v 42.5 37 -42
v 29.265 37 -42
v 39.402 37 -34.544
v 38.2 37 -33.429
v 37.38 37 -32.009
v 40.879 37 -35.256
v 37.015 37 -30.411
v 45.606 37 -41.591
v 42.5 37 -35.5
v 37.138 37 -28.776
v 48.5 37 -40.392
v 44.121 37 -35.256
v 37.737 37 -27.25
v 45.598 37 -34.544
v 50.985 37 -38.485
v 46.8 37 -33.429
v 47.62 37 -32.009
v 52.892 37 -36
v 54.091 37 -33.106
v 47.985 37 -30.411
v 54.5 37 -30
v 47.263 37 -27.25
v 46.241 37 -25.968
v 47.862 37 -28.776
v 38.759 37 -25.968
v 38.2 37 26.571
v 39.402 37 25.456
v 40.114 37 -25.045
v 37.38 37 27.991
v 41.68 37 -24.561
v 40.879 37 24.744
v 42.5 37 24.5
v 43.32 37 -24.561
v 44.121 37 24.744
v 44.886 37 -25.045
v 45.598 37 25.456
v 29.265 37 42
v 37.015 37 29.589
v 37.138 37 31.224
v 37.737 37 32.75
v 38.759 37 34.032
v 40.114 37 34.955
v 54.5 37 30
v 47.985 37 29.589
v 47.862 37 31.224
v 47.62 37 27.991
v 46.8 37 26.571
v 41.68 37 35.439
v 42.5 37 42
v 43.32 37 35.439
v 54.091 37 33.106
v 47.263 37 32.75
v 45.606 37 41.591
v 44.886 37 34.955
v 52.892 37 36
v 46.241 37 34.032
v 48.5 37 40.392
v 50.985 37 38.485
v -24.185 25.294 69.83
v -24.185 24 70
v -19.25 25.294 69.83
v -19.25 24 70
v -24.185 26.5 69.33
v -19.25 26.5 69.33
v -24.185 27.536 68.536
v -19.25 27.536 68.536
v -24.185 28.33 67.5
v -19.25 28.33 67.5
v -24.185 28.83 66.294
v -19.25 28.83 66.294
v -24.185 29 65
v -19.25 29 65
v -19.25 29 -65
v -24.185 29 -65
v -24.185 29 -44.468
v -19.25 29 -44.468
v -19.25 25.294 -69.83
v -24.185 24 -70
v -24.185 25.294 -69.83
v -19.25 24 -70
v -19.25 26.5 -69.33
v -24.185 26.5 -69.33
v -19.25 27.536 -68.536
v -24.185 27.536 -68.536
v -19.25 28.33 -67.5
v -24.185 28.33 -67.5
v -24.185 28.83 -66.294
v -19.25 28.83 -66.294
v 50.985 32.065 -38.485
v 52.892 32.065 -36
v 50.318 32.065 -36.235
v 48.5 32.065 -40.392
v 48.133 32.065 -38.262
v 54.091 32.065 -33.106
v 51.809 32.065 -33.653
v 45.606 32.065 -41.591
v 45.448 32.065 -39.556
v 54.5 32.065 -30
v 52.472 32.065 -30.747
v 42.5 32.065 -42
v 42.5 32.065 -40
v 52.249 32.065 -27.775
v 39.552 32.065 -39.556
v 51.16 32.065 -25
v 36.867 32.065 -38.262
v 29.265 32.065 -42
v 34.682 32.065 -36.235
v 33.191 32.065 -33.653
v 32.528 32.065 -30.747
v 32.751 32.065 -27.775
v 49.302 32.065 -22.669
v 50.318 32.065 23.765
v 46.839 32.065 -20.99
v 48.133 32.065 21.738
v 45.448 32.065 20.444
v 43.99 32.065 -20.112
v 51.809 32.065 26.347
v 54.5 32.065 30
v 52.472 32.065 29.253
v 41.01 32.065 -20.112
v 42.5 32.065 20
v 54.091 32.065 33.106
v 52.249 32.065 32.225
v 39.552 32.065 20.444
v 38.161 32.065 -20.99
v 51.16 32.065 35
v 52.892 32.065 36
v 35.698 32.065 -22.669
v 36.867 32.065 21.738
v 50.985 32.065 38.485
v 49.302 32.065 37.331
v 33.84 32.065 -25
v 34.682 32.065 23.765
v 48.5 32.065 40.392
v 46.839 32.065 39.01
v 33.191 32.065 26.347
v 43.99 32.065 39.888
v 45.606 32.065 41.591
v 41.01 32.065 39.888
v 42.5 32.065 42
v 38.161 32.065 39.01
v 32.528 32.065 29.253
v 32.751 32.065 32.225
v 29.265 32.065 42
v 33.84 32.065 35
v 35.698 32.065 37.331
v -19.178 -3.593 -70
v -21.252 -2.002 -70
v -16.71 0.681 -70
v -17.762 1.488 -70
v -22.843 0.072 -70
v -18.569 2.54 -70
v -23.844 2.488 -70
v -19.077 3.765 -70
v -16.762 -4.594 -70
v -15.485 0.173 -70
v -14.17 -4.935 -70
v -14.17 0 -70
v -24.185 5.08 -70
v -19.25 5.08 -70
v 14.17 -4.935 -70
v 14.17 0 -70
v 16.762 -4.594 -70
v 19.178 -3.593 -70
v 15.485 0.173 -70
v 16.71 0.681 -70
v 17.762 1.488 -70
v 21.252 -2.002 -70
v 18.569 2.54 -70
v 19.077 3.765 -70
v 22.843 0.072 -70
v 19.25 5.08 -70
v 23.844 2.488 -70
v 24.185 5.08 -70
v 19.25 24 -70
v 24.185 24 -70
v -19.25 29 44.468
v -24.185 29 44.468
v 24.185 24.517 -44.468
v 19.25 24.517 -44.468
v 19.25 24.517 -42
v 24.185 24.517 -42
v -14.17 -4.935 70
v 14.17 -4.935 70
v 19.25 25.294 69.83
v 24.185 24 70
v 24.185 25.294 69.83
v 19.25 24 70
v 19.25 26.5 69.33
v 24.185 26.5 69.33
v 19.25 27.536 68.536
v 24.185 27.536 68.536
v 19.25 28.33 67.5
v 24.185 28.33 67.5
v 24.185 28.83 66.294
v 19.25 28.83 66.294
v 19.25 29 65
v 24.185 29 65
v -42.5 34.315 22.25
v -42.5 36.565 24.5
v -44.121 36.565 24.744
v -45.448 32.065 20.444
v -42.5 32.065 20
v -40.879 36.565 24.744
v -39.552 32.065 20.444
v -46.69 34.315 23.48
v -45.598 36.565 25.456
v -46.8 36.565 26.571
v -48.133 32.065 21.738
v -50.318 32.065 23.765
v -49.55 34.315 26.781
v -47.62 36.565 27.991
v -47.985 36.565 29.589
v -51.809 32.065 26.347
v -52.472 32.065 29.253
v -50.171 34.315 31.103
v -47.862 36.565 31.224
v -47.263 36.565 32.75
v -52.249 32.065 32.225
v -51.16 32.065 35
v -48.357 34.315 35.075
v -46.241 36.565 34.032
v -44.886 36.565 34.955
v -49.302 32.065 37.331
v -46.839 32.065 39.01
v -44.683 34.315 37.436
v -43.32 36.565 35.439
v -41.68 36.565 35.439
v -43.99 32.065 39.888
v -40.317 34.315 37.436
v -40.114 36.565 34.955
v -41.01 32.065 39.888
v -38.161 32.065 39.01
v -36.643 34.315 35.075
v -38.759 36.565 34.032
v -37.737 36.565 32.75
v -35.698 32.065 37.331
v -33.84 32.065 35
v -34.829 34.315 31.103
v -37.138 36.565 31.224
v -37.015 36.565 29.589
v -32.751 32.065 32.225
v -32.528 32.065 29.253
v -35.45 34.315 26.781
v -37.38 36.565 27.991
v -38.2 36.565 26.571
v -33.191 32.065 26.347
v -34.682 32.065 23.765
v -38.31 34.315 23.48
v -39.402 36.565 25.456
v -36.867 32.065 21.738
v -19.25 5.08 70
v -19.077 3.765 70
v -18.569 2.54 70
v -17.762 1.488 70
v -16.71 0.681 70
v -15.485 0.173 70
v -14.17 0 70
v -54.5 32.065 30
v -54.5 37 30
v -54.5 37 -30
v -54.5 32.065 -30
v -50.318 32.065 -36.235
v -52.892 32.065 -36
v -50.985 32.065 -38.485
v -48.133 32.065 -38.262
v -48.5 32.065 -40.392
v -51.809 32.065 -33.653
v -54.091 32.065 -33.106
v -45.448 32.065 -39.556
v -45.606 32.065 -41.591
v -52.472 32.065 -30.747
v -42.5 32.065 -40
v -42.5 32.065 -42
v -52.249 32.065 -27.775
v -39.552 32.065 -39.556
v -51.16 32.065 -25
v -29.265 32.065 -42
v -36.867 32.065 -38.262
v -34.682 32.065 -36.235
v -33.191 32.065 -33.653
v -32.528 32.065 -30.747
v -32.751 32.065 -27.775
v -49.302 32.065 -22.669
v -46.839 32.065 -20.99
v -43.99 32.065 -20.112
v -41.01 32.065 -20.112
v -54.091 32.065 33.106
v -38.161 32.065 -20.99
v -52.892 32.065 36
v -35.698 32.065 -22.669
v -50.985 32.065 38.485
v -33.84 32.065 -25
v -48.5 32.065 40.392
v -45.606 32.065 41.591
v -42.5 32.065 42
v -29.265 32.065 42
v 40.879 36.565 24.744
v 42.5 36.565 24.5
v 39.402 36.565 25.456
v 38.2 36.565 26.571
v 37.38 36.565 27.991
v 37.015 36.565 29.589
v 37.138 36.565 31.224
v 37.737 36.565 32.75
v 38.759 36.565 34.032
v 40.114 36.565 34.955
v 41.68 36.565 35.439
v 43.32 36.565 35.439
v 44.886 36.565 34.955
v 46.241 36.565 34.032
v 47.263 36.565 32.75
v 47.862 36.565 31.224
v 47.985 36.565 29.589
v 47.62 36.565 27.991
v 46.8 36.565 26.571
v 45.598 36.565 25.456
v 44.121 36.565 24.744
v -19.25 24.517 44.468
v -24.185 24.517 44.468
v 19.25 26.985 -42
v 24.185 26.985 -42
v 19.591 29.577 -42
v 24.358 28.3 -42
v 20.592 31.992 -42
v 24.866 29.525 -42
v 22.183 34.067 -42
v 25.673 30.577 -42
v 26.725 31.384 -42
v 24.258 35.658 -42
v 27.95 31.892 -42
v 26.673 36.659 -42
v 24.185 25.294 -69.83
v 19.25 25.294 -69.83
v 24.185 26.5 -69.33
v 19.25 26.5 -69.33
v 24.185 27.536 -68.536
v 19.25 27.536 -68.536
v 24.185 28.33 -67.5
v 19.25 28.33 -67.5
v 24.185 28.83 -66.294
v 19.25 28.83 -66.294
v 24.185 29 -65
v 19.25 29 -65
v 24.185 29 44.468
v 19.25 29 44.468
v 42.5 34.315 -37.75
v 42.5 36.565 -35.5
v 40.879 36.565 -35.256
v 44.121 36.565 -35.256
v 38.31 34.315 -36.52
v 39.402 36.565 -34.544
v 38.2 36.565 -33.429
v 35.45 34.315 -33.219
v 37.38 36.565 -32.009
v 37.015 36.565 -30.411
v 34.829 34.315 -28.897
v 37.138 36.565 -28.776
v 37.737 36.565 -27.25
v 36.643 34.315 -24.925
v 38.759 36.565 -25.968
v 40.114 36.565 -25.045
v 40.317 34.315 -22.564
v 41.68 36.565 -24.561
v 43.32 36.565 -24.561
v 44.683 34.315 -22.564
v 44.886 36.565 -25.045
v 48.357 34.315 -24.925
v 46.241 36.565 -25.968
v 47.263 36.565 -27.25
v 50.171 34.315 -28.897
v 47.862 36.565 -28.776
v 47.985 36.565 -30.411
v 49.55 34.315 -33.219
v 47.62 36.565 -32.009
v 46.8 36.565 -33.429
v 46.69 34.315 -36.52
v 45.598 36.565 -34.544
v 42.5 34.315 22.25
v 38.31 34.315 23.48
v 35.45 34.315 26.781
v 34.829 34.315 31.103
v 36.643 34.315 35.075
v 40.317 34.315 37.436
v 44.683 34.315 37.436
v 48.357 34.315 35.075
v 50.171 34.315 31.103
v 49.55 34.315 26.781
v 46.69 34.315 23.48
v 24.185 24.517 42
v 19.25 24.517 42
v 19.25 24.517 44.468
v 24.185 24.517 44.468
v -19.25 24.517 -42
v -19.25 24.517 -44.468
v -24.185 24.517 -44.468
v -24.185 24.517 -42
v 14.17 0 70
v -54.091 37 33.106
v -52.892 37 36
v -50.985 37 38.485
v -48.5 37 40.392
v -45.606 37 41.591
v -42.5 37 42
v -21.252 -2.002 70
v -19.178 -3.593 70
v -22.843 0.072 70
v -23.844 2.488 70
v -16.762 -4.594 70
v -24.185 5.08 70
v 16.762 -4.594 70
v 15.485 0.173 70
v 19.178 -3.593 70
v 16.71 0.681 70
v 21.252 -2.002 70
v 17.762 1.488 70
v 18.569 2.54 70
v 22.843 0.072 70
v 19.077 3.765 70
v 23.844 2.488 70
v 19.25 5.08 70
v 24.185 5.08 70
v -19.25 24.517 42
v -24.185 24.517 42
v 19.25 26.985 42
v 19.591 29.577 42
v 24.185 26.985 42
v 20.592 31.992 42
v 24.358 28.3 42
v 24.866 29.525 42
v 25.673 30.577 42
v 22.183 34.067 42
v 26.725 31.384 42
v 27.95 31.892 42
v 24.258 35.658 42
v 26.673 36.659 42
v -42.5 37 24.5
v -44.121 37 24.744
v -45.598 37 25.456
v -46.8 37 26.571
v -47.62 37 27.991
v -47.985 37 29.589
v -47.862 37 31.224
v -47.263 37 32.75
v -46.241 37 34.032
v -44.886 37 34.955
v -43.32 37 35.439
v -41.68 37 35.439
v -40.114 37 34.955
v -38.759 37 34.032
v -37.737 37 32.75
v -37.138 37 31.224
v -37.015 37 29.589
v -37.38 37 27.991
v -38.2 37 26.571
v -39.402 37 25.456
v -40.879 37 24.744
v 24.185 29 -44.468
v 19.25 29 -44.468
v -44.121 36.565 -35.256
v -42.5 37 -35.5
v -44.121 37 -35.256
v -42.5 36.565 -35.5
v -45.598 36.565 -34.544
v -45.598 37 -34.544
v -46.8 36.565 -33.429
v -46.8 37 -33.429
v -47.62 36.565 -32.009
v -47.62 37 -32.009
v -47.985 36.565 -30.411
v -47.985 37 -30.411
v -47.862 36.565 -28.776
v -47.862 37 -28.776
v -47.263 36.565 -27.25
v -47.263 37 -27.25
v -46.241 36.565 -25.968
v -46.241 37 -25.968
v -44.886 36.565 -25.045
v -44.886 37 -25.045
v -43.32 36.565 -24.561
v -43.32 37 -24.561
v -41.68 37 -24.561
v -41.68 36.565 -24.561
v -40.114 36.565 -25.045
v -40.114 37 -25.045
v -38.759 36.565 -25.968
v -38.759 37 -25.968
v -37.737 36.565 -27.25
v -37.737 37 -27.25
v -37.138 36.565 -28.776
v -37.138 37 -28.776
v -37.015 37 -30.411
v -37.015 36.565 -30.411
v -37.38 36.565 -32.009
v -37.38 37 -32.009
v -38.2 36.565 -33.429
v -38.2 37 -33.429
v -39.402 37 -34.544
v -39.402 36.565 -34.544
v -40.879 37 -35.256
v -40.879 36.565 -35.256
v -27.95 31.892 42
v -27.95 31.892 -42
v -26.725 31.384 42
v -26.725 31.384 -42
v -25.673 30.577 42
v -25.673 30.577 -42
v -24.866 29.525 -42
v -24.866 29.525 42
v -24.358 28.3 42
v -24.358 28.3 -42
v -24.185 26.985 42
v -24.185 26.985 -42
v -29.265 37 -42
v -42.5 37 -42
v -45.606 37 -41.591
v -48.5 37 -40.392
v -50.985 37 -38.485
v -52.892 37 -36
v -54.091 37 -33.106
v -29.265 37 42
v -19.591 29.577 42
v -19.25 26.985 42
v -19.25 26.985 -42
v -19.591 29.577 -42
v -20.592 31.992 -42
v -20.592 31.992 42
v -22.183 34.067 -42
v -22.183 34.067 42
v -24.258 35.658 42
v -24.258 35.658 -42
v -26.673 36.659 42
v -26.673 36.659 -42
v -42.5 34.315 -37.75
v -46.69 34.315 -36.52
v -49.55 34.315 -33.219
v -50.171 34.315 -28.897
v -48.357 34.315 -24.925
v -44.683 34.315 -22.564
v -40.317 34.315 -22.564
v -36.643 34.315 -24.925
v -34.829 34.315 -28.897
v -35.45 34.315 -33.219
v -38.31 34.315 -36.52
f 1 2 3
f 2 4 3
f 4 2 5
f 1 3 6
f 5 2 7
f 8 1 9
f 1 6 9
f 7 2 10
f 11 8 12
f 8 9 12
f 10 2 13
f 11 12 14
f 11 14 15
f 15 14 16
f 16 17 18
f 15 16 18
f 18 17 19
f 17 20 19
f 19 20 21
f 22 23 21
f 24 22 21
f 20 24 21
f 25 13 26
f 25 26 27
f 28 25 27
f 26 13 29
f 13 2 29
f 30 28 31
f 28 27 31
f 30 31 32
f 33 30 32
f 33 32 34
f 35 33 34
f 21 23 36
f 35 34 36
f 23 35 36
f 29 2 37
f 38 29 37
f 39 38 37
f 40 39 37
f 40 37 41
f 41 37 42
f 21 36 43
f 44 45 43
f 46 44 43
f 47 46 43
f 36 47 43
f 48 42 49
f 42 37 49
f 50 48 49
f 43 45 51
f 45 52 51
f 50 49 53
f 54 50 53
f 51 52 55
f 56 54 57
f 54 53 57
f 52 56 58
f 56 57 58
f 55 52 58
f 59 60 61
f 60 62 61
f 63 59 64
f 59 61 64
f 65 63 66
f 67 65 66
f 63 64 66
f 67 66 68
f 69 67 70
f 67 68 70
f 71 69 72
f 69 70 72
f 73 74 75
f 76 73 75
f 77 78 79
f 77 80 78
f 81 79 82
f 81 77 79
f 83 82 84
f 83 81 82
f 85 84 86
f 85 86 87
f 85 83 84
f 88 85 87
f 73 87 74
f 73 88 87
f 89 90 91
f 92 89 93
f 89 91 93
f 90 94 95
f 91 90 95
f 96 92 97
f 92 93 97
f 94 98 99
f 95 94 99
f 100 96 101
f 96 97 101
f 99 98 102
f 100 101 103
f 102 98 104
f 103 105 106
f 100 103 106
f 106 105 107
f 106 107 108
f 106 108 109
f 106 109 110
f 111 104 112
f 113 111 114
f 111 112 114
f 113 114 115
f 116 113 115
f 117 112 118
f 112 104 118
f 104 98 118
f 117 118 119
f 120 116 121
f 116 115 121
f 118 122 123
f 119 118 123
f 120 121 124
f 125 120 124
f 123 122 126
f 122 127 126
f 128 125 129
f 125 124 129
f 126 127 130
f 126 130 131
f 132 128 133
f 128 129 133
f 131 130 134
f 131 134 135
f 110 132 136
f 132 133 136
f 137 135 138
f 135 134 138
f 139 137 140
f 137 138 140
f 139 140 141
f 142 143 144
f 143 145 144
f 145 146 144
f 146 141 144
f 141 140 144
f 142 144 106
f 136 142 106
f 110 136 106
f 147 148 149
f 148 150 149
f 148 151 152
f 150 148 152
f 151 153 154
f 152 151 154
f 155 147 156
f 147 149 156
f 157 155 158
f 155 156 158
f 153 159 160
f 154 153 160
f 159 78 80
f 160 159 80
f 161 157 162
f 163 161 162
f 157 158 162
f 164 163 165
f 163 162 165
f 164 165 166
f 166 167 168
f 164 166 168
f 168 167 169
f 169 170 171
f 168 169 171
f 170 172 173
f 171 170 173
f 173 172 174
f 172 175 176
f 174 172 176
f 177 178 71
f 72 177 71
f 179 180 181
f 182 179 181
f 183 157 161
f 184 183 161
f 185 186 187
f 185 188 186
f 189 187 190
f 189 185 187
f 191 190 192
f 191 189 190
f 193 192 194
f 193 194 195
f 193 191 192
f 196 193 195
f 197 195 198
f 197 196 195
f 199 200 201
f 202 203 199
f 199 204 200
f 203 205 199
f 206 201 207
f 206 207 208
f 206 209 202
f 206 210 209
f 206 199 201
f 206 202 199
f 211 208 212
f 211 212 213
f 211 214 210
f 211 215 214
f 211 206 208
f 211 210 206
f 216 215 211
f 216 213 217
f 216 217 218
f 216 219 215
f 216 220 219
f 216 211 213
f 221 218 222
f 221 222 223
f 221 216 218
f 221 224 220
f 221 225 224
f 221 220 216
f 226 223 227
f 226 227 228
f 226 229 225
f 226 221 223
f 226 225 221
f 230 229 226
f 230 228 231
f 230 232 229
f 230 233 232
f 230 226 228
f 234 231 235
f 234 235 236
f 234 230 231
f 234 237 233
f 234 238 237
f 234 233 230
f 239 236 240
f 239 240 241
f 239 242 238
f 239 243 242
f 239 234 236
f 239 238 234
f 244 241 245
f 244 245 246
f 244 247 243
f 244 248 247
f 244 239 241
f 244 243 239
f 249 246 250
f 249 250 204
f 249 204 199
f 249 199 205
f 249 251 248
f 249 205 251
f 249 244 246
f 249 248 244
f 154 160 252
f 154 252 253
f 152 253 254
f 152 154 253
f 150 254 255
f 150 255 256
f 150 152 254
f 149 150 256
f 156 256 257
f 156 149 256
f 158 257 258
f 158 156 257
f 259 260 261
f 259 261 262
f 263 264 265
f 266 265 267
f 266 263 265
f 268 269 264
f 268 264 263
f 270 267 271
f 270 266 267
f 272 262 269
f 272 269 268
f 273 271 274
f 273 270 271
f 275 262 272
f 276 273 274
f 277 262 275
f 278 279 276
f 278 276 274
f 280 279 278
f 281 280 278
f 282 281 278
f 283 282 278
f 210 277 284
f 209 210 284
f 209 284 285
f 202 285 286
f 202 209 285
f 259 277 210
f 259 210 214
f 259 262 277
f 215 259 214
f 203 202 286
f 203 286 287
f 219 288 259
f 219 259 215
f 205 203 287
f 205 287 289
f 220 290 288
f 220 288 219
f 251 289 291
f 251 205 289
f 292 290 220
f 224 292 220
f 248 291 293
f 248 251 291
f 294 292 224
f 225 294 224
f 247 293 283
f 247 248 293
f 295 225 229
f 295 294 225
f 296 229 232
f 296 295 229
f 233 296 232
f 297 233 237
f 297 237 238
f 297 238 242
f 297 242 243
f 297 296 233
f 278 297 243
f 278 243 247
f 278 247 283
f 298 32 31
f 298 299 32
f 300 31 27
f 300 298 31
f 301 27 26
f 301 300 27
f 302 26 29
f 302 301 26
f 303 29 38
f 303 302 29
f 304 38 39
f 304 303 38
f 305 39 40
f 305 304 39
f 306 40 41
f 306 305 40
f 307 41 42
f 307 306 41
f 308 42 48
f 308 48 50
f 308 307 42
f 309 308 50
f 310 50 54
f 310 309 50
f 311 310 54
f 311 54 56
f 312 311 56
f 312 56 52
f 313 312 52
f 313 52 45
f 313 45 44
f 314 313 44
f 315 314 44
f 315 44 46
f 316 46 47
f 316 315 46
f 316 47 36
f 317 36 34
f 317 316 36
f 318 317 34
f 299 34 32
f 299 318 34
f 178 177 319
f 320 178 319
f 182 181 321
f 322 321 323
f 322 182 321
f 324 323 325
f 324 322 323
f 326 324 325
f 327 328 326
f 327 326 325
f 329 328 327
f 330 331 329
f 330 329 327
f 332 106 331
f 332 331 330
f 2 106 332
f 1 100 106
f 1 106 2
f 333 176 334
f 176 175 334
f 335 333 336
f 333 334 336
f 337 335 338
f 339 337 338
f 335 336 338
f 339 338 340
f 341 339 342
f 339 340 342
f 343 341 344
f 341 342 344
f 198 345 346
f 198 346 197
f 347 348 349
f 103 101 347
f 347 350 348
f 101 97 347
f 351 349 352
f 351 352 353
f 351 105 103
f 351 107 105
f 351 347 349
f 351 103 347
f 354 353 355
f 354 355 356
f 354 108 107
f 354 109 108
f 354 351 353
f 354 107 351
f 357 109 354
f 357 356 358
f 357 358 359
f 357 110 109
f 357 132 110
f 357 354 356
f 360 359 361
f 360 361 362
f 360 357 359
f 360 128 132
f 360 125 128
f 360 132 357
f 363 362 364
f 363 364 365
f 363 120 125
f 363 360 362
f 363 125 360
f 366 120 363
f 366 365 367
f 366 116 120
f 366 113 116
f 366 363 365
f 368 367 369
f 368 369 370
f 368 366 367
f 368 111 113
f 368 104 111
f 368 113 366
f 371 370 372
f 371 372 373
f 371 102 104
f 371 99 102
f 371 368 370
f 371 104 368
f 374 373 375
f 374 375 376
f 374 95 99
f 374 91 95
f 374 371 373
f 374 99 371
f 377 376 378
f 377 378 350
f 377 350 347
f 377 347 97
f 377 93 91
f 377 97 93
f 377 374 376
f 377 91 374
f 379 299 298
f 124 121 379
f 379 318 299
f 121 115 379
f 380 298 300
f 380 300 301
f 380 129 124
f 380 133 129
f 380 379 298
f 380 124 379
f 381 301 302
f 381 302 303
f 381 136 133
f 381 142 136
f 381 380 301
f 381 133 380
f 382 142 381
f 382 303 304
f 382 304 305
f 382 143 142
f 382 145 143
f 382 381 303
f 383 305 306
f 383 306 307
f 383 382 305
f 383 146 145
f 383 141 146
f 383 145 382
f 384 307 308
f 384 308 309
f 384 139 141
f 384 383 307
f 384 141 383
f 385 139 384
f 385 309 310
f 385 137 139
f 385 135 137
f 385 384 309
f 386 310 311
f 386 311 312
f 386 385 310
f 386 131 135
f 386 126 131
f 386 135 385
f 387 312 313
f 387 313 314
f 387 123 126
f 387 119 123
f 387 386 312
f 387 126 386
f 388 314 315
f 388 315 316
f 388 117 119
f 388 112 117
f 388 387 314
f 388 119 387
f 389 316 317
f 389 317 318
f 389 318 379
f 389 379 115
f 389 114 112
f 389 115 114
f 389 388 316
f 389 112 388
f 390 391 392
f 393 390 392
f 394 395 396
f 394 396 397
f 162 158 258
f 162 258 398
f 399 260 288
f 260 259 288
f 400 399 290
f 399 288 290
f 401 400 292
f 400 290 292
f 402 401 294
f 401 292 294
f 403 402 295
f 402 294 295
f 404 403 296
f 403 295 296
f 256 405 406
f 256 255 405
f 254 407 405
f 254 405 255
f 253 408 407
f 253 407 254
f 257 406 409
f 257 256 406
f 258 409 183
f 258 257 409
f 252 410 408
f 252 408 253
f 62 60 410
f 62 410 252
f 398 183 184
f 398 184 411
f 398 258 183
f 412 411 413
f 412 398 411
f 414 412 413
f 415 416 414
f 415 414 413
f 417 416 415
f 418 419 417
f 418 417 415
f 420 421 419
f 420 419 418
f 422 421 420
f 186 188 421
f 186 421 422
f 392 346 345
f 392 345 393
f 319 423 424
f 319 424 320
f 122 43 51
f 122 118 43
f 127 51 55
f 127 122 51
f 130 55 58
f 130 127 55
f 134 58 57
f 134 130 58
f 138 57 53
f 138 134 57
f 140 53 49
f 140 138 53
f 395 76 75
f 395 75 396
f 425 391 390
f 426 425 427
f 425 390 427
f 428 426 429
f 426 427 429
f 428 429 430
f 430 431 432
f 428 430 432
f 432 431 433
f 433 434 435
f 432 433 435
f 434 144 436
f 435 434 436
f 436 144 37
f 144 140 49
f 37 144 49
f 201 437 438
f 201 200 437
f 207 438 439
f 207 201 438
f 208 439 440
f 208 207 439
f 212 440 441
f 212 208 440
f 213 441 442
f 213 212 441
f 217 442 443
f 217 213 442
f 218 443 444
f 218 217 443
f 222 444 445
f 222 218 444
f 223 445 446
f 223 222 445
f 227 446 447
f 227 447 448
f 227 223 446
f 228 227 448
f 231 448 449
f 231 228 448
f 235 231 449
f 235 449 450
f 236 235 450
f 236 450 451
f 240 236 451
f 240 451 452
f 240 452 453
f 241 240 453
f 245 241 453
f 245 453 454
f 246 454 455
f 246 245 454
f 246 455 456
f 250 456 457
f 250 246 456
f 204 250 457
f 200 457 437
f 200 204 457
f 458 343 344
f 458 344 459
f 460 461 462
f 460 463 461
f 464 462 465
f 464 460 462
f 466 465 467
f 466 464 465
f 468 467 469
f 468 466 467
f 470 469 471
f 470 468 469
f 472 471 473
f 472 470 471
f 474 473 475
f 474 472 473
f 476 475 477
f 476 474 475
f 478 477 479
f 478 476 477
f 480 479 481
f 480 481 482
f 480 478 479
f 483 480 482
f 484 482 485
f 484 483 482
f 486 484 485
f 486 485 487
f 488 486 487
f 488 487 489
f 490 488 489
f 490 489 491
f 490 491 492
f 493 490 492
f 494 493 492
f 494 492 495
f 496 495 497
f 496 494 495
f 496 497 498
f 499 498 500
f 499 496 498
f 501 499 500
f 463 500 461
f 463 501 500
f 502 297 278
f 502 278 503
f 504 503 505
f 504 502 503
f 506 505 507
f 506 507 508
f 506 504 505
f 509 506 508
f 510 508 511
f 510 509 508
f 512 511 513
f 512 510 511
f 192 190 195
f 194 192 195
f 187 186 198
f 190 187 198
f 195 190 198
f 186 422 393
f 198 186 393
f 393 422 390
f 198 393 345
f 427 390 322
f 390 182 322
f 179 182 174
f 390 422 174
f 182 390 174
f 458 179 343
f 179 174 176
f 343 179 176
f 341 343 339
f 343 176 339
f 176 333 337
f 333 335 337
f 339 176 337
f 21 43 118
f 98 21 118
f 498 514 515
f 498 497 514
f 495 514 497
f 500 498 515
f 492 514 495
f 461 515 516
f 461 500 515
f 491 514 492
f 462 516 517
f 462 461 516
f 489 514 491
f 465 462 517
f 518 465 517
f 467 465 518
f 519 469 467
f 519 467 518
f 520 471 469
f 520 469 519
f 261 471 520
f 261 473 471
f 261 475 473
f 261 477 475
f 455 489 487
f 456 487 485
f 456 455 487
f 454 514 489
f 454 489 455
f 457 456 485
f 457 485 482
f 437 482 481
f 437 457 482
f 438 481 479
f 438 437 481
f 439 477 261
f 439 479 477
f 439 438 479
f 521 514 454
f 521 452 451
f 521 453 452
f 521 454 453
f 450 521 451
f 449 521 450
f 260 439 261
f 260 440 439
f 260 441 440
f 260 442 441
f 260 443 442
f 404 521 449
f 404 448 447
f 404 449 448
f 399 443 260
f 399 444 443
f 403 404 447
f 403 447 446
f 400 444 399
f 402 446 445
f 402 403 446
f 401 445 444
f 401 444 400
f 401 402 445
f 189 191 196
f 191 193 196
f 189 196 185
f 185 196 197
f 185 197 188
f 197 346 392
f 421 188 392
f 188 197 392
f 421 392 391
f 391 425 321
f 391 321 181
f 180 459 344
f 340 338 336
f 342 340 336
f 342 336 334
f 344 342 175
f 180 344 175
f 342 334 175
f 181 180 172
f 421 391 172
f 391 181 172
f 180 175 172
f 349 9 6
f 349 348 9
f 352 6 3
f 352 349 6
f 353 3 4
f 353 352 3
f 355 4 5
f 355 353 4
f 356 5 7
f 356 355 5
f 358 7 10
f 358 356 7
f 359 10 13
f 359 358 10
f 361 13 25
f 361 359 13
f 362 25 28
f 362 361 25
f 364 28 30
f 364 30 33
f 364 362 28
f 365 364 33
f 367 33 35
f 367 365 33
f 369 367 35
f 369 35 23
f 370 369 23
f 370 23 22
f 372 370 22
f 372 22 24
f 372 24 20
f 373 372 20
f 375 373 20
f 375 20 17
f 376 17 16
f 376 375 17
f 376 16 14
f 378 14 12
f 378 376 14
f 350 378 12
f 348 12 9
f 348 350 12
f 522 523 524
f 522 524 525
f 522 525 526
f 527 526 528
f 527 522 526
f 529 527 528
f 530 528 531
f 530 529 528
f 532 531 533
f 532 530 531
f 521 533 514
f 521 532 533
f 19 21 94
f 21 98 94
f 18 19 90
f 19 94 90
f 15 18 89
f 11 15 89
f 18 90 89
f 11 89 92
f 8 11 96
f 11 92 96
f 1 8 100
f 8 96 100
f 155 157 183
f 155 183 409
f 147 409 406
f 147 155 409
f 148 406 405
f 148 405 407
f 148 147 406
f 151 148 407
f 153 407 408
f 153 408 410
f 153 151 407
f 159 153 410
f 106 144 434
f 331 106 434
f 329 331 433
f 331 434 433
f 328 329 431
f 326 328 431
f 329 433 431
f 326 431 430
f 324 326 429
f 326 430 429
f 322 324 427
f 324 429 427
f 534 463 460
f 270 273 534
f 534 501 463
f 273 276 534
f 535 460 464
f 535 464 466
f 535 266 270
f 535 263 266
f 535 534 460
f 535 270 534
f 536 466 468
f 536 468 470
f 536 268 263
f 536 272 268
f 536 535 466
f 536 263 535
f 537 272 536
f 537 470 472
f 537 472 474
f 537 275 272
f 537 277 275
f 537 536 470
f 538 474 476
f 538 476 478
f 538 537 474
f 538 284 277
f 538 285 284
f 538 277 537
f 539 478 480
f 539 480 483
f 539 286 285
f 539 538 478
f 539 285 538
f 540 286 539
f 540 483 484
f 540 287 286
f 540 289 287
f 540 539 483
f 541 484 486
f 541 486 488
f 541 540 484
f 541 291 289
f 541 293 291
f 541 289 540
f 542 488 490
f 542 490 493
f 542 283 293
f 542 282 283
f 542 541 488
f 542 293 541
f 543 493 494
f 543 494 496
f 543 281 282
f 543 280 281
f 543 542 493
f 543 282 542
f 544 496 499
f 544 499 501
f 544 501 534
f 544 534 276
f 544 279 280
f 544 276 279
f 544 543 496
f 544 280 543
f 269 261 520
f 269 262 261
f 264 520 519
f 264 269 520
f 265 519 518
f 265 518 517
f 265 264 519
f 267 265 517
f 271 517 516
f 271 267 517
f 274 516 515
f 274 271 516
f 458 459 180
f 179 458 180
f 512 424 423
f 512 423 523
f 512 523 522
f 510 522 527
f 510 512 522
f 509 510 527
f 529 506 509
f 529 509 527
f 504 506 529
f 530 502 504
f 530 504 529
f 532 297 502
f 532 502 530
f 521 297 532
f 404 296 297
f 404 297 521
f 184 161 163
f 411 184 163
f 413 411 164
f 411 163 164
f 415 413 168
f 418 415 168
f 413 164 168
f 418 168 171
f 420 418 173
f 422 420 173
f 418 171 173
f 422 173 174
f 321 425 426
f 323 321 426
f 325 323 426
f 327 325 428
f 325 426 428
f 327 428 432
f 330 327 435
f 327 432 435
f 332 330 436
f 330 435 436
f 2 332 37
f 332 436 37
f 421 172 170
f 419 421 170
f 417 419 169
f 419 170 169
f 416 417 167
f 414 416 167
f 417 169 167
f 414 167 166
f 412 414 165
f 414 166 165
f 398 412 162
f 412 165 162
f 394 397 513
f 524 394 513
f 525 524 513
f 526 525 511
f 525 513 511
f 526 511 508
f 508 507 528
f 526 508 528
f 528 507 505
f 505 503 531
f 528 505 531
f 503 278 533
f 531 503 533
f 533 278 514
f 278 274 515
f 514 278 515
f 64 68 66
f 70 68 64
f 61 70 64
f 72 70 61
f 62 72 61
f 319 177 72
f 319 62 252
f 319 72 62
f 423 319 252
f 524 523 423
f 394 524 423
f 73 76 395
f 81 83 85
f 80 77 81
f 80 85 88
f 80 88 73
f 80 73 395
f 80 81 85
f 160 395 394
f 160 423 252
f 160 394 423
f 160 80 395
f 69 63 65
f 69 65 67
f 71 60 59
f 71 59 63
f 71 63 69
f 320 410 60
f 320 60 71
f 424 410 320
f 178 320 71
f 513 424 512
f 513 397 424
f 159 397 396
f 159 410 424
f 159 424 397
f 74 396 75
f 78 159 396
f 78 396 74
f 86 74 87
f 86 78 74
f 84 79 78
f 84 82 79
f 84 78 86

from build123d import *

# Parameters (mm, degrees)
SKETCH1_W                                     = 38.5
SKETCH1_H                                     = 140
BASE_FLANGE1_DEPTH                            = 4.93522
EDGE_FLANGE1_STRIP_W                          = 29.90088
EDGE_FLANGE1_STRIP_H                          = 4.93522
EDGE_FLANGE1_STRIP_CUT_DEPTH                  = 140
EDGE_FLANGE1_DEPTH                            = 140
EDGE_FLANGE2_STRIP_W                          = 29.90088
EDGE_FLANGE2_STRIP_H                          = 4.93522
EDGE_FLANGE2_STRIP_CUT_DEPTH                  = 84
EDGE_FLANGE2_RELIEF_W                         = 32.36849
EDGE_FLANGE2_RELIEF_H                         = 2.46761
EDGE_FLANGE2_RELIEF_CUT_DEPTH                 = 4.93522
EDGE_FLANGE2_DEPTH                            = 84
FILLET1_R                                     = 12
CUT_EXTRUDE1_REACH                            = 92.308
SKETCH20_W                                    = 25.53239
SKETCH20_H                                    = 8
FILLET2_R                                     = 5
FILLET1_OF_MIRROR1_R                          = 12
FILLET2_OF_MIRROR1_R                          = 5
CSK_FOR_M10_FLAT_HEAD_MACHINE_SCREW1_AT_COUNT = 2
CSK_FOR_M10_FLAT_HEAD_MACHINE_SCREW1_AT_PITCH = 52.021630117
CSK_FOR_M10_FLAT_HEAD_MACHINE_SCREW1_2_COUNT  = 2
CSK_FOR_M10_FLAT_HEAD_MACHINE_SCREW1_2_PITCH  = 104.043260233
CSK_FOR_M10_FLAT_HEAD_MACHINE_SCREW1_3_COUNT  = 2
CSK_FOR_M10_FLAT_HEAD_MACHINE_SCREW1_3_PITCH  = 85
CSK_FOR_M10_FLAT_HEAD_MACHINE_SCREW1_4_COUNT  = 2
CSK_FOR_M10_FLAT_HEAD_MACHINE_SCREW1_4_PITCH  = 60


# Sheet-metal steps are written as plain solids
with BuildPart() as part:
    # Sketch1 → Base-Flange1 (new body)
    with BuildSketch(Plane(origin=(0, 0, 0), x_dir=(1, 0, 0), z_dir=(0, 1, 0))):
        Rectangle(SKETCH1_W, SKETCH1_H)
    extrude(amount=-BASE_FLANGE1_DEPTH)

    # Edge-Flange1 strip (across the edge) → Edge-Flange1 strip cut (cut)
    with BuildSketch(Plane(origin=(-19.25, 0, -70), x_dir=(1, 0, 0), z_dir=(0, 0, 1))):
        with Locations((-9.87044, -2.46761)):
            Rectangle(EDGE_FLANGE1_STRIP_W, EDGE_FLANGE1_STRIP_H)
    edge_flange1_strip_cut = extrude(amount=EDGE_FLANGE1_STRIP_CUT_DEPTH, mode=Mode.SUBTRACT)

    # Edge-Flange1 section (across the edge) → Edge-Flange1 (add)
    with BuildSketch(Plane(origin=(-19.25, 0, -70), x_dir=(1, 0, 0), z_dir=(0, 0, 1))):
        with BuildLine():
            Line((-4.93522, 5.08), (-4.93522, 37))
            Line((-4.93522, 37), (0, 37))
            Line((0, 37), (0, 5.08))
            ThreePointArc((0, 5.08), (1.487897552, 1.487897552), (5.08, 0))
            Line((5.08, 0), (5.08, -4.93522))
            ThreePointArc((5.08, -4.93522), (-2.001829977, -2.001829977), (-4.93522, 5.08))
        make_face()
    edge_flange1 = extrude(amount=EDGE_FLANGE1_DEPTH)

    # Edge-Flange2 strip (across the edge) → Edge-Flange2 strip cut (cut)
    with BuildSketch(Plane(origin=(-24.18522, 37, 42), x_dir=(0, -1, 0), z_dir=(0, 0, -1))):
        with Locations((-4.93522, -2.46761)):
            Rectangle(EDGE_FLANGE2_STRIP_W, EDGE_FLANGE2_STRIP_H)
    edge_flange2_strip_cut = extrude(amount=EDGE_FLANGE2_STRIP_CUT_DEPTH, mode=Mode.SUBTRACT)

    # Edge-Flange2 relief (on the sheet) → Edge-Flange2 relief cut (cut)
    with BuildSketch(Plane(origin=(-24.18522, 26.98478, 42), x_dir=(0, -1, 0), z_dir=(-1, 0, 0))):
        with Locations((-13.716635, 1.233805)):
            Rectangle(EDGE_FLANGE2_RELIEF_W, EDGE_FLANGE2_RELIEF_H)
        with Locations((-13.716635, -85.233805)):
            Rectangle(EDGE_FLANGE2_RELIEF_W, EDGE_FLANGE2_RELIEF_H)
    edge_flange2_relief_cut = extrude(amount=-EDGE_FLANGE2_RELIEF_CUT_DEPTH, mode=Mode.SUBTRACT)

    # Edge-Flange2 section (across the edge) → Edge-Flange2 (add)
    with BuildSketch(Plane(origin=(-24.18522, 37, 42), x_dir=(0, -1, 0), z_dir=(0, 0, -1))):
        with BuildLine():
            Line((0, 5.08), (0, 30.31478))
            Line((0, 30.31478), (4.93522, 30.31478))
            Line((4.93522, 30.31478), (4.93522, 5.08))
            ThreePointArc((4.93522, 5.08), (6.423117552, 1.487897552), (10.01522, 0))
            Line((10.01522, 0), (10.01522, -4.93522))
            ThreePointArc((10.01522, -4.93522), (2.933390023, -2.001829977), (0, 5.08))
        make_face()
    edge_flange2 = extrude(amount=EDGE_FLANGE2_DEPTH)

    # Fillet1
    fillet1_edges = [part.edges().sort_by_distance(p)[0] for p in [
        (-54.5, 34.53239, 42),
        (-54.5, 34.53239, -42),
    ]]
    fillet(fillet1_edges, radius=FILLET1_R)

    # Sketch20 → Cut-Extrude1 (cut, up to next)
    with BuildSketch(Plane.ZY.offset(24.18522), mode=Mode.PRIVATE) as cut_extrude1_sk1:
        with Locations((-57.233805, 33)):
            Rectangle(SKETCH20_W, SKETCH20_H)
    cut_extrude1_tool1 = extrude(cut_extrude1_sk1.sketch, amount=-CUT_EXTRUDE1_REACH, mode=Mode.PRIVATE) & part.part
    # Sketch20 → Cut-Extrude1 (cut, up to next)
    with BuildSketch(Plane.ZY.offset(24.18522), mode=Mode.PRIVATE) as cut_extrude1_sk2:
        with Locations((57.233805, 33)):
            Rectangle(SKETCH20_W, SKETCH20_H)
    cut_extrude1_tool2 = extrude(cut_extrude1_sk2.sketch, amount=-CUT_EXTRUDE1_REACH, mode=Mode.PRIVATE) & part.part
    cut_extrude1_1 = cut_extrude1_tool1.solids().sort_by_distance((-24.18522, 33, -57.233805))[0]
    add(cut_extrude1_1, mode=Mode.SUBTRACT)
    cut_extrude1_2 = cut_extrude1_tool2.solids().sort_by_distance((-24.18522, 33, 57.233805))[0]
    add(cut_extrude1_2, mode=Mode.SUBTRACT)
    cut_extrude1 = cut_extrude1_1 + cut_extrude1_2  # Cut-Extrude1 as one shape, for the pattern or mirror that repeats it

    # Fillet2
    fillet2_edges = [part.edges().sort_by_distance(p)[0] for p in [
        (-21.71761, 29, -70),
        (-21.71761, 29, 70),
    ]]
    fillet(fillet2_edges, radius=FILLET2_R)

    # Mirror1: Edge-Flange1 strip cut, Edge-Flange1, Edge-Flange2 strip cut, Edge-Flange2 relief cut, Edge-Flange2, Cut-Extrude1 across plane
    add(edge_flange1_strip_cut.mirror(Plane(origin=(0, 0, 0), x_dir=(0, 0, 1), z_dir=(1, 0, 0))), mode=Mode.SUBTRACT)
    add(edge_flange1.mirror(Plane(origin=(0, 0, 0), x_dir=(0, 0, 1), z_dir=(1, 0, 0))))
    add(edge_flange2_strip_cut.mirror(Plane(origin=(0, 0, 0), x_dir=(0, 0, 1), z_dir=(1, 0, 0))), mode=Mode.SUBTRACT)
    add(edge_flange2_relief_cut.mirror(Plane(origin=(0, 0, 0), x_dir=(0, 0, 1), z_dir=(1, 0, 0))), mode=Mode.SUBTRACT)
    add(edge_flange2.mirror(Plane(origin=(0, 0, 0), x_dir=(0, 0, 1), z_dir=(1, 0, 0))))
    add(cut_extrude1.mirror(Plane(origin=(0, 0, 0), x_dir=(0, 0, 1), z_dir=(1, 0, 0))), mode=Mode.SUBTRACT)

    # Fillet1 of Mirror1
    fillet1_of_mirror1_edges = [part.edges().sort_by_distance(p)[0] for p in [
        (54.5, 34.53239, 42),
        (54.5, 34.53239, -42),
    ]]
    fillet(fillet1_of_mirror1_edges, radius=FILLET1_OF_MIRROR1_R)

    # Fillet2 of Mirror1
    fillet2_of_mirror1_edges = [part.edges().sort_by_distance(p)[0] for p in [
        (21.71761, 29, -70),
        (21.71761, 29, 70),
    ]]
    fillet(fillet2_of_mirror1_edges, radius=FILLET2_OF_MIRROR1_R)

    # Sketch30 → CSK for M10 Flat Head Machine Screw1 (revolve, cut)
    with BuildSketch(Plane(origin=(42.5, 32.06478, 30), x_dir=(0, 0, -1), z_dir=(1, 0, 0))):
        Polygon((0, 0), (0, 4.93522), (5.5, 4.93522), (5.5, 4.5), (10, 0), align=None)
    csk_for_m10_flat_head_machine_screw1 = revolve(axis=Axis((42.5, 25.71478, 30), (0, 1, 0)), mode=Mode.SUBTRACT)

    # CSK for M10 Flat Head Machine Screw1 at: CSK for M10 Flat Head Machine Screw1 ×2
    with Locations(*[Vector(-0.8169678632647617, 0, -0.5766831975986554) * (i * CSK_FOR_M10_FLAT_HEAD_MACHINE_SCREW1_AT_PITCH) for i in range(1, CSK_FOR_M10_FLAT_HEAD_MACHINE_SCREW1_AT_COUNT)]):
        add(csk_for_m10_flat_head_machine_screw1, mode=Mode.SUBTRACT)

    # CSK for M10 Flat Head Machine Screw1 2: CSK for M10 Flat Head Machine Screw1 ×2
    with Locations(*[Vector(-0.8169678632647617, 0, -0.5766831975986554) * (i * CSK_FOR_M10_FLAT_HEAD_MACHINE_SCREW1_2_PITCH) for i in range(1, CSK_FOR_M10_FLAT_HEAD_MACHINE_SCREW1_2_COUNT)]):
        add(csk_for_m10_flat_head_machine_screw1, mode=Mode.SUBTRACT)

    # CSK for M10 Flat Head Machine Screw1 3: CSK for M10 Flat Head Machine Screw1 ×2
    with Locations(*[(-i * CSK_FOR_M10_FLAT_HEAD_MACHINE_SCREW1_3_PITCH, 0, 0) for i in range(1, CSK_FOR_M10_FLAT_HEAD_MACHINE_SCREW1_3_COUNT)]):
        add(csk_for_m10_flat_head_machine_screw1, mode=Mode.SUBTRACT)

    # CSK for M10 Flat Head Machine Screw1 4: CSK for M10 Flat Head Machine Screw1 ×2
    with Locations(*[(0, 0, -i * CSK_FOR_M10_FLAT_HEAD_MACHINE_SCREW1_4_PITCH) for i in range(1, CSK_FOR_M10_FLAT_HEAD_MACHINE_SCREW1_4_COUNT)]):
        add(csk_for_m10_flat_head_machine_screw1, mode=Mode.SUBTRACT)


solid = part.part
